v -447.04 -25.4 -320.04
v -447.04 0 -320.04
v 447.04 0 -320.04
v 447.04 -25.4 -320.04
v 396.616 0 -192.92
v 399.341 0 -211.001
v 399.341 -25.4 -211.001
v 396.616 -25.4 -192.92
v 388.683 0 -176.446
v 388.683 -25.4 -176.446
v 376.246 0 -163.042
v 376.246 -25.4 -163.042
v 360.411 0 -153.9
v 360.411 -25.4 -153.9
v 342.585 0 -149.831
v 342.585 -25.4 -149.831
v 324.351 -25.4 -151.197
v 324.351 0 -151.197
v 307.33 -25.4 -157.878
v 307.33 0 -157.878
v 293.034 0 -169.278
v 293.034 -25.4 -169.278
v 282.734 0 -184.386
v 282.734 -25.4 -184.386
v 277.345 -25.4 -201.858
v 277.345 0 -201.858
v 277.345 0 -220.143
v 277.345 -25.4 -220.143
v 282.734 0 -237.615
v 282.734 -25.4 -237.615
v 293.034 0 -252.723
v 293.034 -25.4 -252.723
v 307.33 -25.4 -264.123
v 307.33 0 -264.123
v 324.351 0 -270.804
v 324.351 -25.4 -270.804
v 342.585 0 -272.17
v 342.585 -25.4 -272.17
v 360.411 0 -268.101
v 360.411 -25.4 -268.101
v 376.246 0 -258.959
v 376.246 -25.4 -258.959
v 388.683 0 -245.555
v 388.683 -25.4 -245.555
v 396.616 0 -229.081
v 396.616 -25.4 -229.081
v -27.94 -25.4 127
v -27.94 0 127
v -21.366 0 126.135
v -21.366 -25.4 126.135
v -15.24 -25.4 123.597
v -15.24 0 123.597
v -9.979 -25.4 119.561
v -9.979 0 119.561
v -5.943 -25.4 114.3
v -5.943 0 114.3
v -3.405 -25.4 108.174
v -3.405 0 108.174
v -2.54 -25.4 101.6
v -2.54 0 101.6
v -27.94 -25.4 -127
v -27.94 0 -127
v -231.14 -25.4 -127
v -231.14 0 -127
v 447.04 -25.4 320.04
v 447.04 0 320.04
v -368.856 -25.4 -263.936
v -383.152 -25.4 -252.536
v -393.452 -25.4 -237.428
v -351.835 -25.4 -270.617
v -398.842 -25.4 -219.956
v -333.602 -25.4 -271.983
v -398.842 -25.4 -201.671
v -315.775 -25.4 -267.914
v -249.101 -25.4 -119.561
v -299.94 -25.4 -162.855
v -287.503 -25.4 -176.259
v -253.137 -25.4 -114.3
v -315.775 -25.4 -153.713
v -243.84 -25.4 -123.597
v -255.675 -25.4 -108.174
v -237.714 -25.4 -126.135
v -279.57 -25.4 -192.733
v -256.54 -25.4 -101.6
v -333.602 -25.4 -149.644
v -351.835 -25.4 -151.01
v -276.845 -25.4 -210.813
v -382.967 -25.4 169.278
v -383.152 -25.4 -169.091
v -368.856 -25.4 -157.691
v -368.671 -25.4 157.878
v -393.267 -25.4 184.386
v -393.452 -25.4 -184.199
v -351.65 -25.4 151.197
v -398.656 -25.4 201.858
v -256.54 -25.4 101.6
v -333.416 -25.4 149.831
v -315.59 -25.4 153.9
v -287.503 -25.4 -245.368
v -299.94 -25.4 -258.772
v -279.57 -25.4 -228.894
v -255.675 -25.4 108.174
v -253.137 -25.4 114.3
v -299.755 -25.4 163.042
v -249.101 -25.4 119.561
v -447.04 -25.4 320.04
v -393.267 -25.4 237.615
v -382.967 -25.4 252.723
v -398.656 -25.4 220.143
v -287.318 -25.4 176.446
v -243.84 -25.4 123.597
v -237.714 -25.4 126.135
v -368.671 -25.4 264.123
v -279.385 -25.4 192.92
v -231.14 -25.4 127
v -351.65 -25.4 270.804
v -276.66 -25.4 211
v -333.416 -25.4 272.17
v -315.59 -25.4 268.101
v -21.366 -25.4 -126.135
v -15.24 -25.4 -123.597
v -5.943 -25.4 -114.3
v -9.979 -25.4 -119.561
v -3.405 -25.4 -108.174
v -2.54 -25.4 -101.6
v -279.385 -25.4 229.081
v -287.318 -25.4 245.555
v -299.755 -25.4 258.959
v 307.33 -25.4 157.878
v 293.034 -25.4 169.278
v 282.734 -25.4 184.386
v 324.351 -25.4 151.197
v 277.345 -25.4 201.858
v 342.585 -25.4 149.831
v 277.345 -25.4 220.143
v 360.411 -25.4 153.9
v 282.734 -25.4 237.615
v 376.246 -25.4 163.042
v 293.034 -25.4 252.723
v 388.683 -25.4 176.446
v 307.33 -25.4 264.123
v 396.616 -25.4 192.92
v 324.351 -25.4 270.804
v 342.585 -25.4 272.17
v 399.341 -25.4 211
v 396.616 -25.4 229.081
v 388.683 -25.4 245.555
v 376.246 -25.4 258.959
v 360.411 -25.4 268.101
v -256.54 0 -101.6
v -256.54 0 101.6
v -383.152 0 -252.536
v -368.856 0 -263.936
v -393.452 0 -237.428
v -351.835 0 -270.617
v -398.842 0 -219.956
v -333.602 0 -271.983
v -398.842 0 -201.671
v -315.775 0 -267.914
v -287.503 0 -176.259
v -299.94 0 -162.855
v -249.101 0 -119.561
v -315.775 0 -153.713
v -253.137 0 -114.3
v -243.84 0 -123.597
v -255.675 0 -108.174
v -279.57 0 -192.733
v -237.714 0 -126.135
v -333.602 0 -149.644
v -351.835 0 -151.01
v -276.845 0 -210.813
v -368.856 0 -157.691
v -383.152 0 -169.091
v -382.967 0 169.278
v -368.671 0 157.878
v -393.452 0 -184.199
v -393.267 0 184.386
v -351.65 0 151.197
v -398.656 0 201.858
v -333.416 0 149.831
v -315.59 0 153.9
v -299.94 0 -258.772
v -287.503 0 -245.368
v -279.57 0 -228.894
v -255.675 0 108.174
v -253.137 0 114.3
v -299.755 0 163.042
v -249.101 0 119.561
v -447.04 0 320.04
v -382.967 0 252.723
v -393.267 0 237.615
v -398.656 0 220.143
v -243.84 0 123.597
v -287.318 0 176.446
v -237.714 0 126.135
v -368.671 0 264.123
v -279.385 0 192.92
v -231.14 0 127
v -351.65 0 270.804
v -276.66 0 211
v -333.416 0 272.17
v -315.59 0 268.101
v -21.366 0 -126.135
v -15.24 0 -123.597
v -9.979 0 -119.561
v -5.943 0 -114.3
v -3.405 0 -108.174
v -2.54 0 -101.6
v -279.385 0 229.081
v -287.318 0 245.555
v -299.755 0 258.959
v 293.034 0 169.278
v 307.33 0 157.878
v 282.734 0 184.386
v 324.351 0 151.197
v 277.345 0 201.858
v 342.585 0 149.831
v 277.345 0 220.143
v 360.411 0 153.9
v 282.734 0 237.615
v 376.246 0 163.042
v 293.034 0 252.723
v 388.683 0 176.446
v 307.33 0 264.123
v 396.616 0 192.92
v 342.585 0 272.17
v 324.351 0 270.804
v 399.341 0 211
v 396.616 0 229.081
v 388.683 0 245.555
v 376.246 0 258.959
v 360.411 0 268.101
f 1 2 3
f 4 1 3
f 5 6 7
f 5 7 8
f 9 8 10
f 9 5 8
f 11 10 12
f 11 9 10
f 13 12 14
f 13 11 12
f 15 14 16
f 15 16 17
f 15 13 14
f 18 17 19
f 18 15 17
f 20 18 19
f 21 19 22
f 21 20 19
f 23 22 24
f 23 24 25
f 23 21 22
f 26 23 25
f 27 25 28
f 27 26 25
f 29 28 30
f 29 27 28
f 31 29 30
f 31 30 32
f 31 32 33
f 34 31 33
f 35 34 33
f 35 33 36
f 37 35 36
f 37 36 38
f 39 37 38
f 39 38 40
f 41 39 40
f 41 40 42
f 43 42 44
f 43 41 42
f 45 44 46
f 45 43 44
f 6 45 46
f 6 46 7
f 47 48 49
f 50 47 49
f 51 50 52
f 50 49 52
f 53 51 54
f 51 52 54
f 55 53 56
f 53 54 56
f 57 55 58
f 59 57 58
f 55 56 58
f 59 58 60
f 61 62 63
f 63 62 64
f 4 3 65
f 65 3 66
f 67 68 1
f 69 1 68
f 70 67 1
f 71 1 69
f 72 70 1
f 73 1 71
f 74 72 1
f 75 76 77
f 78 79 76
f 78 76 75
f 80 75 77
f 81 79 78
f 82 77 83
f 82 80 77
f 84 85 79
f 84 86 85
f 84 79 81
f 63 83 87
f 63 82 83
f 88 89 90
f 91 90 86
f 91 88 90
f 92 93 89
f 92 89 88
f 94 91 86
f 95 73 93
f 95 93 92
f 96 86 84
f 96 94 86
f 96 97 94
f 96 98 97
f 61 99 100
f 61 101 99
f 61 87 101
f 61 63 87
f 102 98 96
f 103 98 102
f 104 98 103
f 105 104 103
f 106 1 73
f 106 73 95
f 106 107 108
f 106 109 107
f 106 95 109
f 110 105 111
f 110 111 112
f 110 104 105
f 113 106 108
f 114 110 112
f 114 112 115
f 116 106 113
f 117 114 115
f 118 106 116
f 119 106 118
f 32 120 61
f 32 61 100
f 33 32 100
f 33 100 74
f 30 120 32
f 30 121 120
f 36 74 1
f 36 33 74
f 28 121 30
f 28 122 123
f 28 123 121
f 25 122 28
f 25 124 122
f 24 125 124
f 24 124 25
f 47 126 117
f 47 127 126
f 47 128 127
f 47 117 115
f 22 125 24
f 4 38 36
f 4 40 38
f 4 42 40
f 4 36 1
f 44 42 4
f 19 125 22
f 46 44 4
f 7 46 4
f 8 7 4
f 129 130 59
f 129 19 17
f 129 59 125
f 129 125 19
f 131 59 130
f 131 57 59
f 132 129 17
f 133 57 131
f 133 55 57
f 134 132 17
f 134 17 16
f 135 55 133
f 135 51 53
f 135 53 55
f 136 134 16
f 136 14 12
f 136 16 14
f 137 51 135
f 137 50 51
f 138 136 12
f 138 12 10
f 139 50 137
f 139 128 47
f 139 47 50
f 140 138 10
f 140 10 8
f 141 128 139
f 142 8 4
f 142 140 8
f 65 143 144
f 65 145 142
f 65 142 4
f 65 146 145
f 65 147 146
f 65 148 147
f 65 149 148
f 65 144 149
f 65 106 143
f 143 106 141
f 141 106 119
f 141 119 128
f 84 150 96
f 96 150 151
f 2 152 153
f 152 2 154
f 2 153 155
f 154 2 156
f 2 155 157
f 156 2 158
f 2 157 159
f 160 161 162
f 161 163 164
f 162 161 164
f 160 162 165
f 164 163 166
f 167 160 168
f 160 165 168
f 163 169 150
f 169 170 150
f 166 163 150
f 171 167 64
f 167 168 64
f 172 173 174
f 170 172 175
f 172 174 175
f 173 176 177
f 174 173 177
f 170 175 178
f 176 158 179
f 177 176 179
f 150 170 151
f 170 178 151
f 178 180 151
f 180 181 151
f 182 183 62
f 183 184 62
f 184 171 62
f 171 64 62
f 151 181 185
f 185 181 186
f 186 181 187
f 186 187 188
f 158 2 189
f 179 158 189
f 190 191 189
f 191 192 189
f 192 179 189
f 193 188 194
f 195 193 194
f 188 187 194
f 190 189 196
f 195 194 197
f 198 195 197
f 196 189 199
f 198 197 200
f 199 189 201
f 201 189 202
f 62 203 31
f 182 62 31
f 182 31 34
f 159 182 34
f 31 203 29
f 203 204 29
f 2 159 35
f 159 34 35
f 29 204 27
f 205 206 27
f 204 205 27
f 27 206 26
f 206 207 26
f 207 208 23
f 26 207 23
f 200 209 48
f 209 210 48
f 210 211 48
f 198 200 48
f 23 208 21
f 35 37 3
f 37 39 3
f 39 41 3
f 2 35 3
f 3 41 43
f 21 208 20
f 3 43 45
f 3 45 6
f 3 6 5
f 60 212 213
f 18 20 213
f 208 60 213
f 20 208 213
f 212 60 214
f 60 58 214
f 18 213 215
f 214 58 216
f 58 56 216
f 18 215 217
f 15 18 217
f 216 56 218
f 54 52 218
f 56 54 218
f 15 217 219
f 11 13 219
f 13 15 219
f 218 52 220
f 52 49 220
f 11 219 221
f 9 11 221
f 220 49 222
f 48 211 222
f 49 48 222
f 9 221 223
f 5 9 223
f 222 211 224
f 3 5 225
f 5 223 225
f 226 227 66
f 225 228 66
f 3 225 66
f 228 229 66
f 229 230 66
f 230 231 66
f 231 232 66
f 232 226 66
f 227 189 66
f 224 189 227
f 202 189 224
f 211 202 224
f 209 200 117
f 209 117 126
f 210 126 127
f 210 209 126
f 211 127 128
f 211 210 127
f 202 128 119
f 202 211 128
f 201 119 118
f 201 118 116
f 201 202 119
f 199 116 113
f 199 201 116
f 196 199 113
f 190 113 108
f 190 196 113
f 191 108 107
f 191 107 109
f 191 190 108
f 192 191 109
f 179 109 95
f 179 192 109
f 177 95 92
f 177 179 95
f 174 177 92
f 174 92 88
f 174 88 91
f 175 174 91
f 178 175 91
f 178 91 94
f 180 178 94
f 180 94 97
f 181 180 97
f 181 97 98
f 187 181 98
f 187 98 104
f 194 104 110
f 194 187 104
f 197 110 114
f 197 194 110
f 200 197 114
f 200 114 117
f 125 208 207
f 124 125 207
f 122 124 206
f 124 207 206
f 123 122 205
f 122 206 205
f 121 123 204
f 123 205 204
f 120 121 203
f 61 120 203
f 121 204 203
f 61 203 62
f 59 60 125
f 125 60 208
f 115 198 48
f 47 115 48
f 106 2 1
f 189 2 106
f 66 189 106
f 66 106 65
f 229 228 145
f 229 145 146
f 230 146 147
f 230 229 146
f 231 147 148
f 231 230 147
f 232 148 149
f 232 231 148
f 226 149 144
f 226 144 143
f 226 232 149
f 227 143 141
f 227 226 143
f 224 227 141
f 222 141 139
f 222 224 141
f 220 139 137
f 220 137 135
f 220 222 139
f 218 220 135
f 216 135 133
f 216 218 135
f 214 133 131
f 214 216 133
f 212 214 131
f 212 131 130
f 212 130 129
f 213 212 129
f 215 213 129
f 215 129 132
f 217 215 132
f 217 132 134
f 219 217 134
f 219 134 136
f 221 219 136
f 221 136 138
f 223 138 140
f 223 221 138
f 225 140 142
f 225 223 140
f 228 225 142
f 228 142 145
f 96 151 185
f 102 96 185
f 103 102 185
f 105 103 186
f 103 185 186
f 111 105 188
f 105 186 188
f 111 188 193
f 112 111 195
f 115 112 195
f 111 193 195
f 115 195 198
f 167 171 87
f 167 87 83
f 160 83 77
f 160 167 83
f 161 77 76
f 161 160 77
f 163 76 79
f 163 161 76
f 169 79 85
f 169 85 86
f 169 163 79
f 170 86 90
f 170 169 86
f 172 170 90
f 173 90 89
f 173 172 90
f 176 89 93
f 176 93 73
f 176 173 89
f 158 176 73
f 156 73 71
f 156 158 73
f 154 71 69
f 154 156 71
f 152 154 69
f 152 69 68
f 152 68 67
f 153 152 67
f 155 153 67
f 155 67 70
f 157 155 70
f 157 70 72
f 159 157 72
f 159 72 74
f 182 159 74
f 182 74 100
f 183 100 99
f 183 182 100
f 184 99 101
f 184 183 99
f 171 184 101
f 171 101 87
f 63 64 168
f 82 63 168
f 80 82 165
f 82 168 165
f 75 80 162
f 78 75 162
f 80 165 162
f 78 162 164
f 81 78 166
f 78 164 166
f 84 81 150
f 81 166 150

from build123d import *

# Parameters (mm, degrees)
F0_W     = 894.08
F0_H     = 640.08
F0_R     = 61.341
F1_DEPTH = 25.4


with BuildPart() as f1:
    # F0 (on Front) → F1 (new body)
    with BuildSketch(Plane.XZ):
        Rectangle(F0_W, F0_H)
        with Locations((-338.185633, -210.813498)):
            Circle(F0_R, mode=Mode.SUBTRACT)
        with Locations((338.000492, -211.000518)):
            Circle(F0_R, mode=Mode.SUBTRACT)
        with BuildLine():
            ThreePointArc((-27.94, 127), (-9.979488, 119.560512), (-2.54, 101.6))
            Line((-2.54, 101.6), (-2.54, -101.6))
            ThreePointArc((-2.54, -101.6), (-9.979488, -119.560512), (-27.94, -127))
            Line((-27.94, -127), (-231.14, -127))
            ThreePointArc((-231.14, -127), (-249.100512, -119.560512), (-256.54, -101.6))
            Line((-256.54, -101.6), (-256.54, 101.6))
            ThreePointArc((-256.54, 101.6), (-249.100512, 119.560512), (-231.14, 127))
            Line((-231.14, 127), (-27.94, 127))
        make_face(mode=Mode.SUBTRACT)
        with Locations((-338.000518, 211.000492)):
            Circle(F0_R, mode=Mode.SUBTRACT)
        with Locations((338.000492, 211.000492)):
            Circle(F0_R, mode=Mode.SUBTRACT)
    extrude(amount=F1_DEPTH)


solid = f1.part
